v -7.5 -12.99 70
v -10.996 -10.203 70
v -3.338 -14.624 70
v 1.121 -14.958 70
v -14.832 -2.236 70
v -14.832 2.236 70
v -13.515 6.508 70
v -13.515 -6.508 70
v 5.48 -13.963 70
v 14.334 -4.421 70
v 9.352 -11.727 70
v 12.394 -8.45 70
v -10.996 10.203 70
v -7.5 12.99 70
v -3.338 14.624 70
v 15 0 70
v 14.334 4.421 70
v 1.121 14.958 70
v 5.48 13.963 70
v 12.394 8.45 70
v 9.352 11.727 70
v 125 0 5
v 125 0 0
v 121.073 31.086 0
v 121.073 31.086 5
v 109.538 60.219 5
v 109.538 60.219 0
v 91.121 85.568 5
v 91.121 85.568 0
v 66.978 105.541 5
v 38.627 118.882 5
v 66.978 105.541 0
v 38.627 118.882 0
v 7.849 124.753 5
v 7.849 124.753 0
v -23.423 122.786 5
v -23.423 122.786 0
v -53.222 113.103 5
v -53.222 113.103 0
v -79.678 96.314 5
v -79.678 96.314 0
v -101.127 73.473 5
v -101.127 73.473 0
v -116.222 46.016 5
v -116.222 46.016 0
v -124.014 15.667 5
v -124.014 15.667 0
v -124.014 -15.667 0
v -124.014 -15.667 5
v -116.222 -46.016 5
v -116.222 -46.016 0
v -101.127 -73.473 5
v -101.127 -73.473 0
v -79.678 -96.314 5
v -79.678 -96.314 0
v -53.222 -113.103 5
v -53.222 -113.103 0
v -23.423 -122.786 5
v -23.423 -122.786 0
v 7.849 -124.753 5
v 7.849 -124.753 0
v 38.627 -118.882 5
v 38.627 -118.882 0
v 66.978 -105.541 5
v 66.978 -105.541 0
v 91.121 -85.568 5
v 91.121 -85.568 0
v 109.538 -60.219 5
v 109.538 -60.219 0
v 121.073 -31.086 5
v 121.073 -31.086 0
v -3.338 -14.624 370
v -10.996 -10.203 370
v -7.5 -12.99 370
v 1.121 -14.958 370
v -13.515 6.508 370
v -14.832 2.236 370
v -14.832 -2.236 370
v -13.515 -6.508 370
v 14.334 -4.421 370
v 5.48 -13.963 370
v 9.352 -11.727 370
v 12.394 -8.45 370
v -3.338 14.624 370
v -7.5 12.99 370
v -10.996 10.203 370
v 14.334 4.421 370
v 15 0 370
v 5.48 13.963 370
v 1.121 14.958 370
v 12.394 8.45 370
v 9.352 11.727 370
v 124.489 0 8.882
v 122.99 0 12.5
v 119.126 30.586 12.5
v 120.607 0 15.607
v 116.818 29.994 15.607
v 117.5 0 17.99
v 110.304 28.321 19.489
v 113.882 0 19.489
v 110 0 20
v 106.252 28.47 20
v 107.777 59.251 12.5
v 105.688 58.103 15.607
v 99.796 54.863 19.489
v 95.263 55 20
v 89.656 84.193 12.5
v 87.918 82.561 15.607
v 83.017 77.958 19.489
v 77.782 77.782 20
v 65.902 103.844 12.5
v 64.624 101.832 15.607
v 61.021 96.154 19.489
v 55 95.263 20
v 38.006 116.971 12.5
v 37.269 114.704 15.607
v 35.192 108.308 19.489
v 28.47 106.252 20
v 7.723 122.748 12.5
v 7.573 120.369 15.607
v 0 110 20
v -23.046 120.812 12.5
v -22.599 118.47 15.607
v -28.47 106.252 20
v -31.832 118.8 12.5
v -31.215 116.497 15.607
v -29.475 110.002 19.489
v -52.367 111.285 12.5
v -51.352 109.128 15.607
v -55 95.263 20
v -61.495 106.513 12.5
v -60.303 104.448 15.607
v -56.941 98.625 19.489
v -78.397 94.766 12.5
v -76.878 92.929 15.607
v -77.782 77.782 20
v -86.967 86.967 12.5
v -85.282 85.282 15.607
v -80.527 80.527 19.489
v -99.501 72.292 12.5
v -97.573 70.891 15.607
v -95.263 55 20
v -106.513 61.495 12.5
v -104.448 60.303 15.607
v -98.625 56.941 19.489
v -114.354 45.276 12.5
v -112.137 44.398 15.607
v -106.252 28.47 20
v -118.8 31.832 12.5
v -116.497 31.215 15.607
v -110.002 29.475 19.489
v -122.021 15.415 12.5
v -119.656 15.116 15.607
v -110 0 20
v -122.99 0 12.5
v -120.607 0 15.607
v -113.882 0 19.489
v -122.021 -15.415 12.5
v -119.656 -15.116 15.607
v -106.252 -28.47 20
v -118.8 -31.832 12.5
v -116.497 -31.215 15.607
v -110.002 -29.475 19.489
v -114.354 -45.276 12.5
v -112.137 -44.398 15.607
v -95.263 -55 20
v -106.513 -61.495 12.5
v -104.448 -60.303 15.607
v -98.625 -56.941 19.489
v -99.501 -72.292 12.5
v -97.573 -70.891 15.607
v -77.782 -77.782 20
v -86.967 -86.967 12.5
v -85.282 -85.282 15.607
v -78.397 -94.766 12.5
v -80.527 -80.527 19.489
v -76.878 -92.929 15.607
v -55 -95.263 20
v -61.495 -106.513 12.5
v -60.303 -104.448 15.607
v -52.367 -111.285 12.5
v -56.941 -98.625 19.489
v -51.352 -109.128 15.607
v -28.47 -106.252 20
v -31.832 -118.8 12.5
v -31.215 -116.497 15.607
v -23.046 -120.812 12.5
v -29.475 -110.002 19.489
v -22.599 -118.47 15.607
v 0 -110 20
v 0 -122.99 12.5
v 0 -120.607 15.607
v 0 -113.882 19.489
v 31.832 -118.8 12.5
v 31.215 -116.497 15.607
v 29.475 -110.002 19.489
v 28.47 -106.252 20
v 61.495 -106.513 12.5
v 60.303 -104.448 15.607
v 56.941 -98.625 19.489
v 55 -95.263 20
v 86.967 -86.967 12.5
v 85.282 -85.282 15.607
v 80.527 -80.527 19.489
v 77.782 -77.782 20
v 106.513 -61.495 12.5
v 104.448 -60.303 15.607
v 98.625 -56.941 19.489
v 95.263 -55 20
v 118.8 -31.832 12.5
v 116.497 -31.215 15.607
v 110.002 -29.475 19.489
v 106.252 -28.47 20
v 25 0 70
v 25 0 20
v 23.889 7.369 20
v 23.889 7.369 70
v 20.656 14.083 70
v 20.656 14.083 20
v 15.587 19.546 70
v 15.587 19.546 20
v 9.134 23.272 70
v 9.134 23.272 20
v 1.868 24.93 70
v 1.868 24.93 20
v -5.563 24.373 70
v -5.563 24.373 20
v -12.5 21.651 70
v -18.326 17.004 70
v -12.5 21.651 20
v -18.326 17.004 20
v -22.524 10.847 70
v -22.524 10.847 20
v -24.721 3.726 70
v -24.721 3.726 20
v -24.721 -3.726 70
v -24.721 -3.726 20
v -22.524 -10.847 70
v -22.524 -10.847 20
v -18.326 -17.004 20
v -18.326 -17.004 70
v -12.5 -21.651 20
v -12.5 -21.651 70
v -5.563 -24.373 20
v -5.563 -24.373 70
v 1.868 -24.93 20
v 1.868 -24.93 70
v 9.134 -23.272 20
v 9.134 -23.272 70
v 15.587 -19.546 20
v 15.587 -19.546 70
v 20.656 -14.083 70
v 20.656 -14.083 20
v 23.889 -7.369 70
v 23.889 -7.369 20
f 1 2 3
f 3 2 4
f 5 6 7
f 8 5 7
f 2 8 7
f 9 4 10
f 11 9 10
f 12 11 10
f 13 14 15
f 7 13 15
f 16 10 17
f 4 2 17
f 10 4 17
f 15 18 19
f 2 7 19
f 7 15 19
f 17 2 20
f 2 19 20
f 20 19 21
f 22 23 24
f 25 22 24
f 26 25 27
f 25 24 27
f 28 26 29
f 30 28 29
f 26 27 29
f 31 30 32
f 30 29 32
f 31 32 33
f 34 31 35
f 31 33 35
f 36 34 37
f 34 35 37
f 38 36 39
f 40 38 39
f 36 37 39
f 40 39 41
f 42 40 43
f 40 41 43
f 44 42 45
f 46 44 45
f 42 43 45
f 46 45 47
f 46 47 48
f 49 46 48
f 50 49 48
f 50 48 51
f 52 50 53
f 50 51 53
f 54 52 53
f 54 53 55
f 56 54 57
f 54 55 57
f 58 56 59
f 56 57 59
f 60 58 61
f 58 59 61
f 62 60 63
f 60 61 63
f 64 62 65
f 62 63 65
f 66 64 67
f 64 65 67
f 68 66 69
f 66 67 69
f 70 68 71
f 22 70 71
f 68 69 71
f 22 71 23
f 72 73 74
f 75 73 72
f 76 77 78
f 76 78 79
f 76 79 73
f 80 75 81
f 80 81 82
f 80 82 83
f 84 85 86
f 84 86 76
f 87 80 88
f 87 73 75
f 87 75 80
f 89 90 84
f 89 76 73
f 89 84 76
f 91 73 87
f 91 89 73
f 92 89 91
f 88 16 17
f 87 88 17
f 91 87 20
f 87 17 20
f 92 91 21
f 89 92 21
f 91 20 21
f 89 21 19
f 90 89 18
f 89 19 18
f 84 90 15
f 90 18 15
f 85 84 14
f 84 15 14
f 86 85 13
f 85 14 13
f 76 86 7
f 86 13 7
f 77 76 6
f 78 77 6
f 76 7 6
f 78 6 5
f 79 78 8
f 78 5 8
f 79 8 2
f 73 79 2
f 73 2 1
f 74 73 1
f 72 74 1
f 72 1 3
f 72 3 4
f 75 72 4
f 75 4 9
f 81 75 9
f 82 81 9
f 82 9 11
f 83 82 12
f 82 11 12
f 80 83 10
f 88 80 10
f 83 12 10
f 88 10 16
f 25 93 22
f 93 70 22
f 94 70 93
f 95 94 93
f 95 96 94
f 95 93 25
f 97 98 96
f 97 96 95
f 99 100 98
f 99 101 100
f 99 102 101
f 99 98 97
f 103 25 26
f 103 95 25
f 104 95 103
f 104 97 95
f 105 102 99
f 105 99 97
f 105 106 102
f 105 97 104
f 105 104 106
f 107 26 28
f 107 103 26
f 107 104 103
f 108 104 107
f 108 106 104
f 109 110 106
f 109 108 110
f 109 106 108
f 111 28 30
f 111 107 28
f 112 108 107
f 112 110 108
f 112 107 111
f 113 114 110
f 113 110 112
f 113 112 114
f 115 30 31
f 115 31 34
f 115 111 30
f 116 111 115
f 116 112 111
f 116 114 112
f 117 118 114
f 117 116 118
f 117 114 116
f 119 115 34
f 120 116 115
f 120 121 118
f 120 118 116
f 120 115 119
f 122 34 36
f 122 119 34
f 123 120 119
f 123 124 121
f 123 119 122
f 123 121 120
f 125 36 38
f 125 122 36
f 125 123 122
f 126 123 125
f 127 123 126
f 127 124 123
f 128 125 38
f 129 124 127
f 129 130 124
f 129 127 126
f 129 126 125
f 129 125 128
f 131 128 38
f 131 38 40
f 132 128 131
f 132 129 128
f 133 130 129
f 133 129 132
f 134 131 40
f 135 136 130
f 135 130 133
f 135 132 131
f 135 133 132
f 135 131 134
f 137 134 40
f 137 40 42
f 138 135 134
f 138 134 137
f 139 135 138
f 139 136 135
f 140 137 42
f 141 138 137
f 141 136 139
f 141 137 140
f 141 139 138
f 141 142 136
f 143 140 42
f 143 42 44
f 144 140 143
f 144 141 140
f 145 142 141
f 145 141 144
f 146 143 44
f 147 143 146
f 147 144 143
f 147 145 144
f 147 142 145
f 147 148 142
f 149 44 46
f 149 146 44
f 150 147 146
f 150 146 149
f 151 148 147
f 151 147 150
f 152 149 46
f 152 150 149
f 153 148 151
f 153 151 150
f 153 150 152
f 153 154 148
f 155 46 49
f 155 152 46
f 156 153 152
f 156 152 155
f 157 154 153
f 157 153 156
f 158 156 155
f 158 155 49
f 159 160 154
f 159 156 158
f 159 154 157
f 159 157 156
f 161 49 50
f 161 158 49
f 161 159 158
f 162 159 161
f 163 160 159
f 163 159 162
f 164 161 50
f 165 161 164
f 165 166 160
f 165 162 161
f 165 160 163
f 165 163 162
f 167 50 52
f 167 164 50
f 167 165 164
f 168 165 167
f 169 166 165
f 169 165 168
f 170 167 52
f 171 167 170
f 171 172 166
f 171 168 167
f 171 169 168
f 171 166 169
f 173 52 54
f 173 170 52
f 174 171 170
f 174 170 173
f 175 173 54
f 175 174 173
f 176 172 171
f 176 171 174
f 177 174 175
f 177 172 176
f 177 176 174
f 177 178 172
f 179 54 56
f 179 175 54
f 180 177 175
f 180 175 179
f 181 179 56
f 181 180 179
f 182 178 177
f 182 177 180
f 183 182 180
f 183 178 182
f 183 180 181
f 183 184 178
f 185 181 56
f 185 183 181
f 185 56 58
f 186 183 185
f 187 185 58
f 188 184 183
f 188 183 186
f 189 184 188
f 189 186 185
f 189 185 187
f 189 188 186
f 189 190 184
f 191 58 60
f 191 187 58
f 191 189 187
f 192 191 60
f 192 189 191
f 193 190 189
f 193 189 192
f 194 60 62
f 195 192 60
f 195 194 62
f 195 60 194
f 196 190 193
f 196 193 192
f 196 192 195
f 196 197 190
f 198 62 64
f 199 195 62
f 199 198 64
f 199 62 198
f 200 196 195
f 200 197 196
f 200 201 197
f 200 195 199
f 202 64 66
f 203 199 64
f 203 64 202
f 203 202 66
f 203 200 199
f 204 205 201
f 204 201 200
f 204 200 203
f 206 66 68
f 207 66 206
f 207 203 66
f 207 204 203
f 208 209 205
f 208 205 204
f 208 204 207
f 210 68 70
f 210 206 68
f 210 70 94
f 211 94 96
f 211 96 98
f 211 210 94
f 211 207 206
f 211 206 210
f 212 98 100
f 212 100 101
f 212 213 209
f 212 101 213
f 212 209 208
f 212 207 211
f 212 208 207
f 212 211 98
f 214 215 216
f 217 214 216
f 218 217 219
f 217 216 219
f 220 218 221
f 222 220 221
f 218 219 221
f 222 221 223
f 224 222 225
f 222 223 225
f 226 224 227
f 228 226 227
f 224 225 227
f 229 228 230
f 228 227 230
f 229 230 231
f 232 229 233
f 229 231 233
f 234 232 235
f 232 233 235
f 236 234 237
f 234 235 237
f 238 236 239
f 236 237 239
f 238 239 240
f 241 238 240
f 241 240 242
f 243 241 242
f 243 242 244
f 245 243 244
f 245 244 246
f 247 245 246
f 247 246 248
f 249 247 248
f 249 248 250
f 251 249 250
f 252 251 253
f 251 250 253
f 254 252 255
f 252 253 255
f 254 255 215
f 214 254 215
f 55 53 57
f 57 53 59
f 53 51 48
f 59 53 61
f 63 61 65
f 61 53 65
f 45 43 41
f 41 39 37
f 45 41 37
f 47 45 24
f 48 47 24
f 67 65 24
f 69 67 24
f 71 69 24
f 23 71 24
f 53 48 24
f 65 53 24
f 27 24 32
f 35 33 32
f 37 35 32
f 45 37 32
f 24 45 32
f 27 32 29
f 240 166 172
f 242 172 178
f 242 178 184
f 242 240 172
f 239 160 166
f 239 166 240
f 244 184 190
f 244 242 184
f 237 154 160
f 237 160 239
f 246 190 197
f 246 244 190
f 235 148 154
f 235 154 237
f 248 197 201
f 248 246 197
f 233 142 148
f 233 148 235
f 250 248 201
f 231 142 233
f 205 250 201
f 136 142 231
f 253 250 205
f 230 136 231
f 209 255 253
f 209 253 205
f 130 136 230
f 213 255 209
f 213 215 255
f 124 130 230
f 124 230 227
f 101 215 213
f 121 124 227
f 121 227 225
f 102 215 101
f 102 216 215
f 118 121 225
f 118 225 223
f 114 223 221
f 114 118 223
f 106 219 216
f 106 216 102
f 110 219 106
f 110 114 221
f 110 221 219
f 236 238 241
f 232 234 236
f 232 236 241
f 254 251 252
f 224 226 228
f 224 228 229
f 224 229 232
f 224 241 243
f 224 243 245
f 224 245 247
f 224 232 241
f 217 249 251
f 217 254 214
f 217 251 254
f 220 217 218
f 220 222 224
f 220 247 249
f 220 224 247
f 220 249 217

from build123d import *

# Parameters (mm, degrees)
SKETCH_R     = 125
PAD_DEPTH    = 20
SKETCH001_R  = 25
PAD001_DEPTH = 50
FILLET006_R  = 15
SKETCH002_R  = 15
PAD002_DEPTH = 300


with BuildPart() as body1:
    # Sketch → Pad (new body)
    with BuildSketch(Plane.XY):
        Circle(SKETCH_R)
    extrude(amount=PAD_DEPTH)

    # Sketch001 (on Face3 of Pad) → Pad001 (join)
    with BuildSketch(Plane.XY.offset(20)):
        Circle(SKETCH001_R)
    extrude(amount=PAD001_DEPTH)

    # Fillet006
    fillet006_edges = [body1.edges().sort_by_distance(p)[0] for p in [
        (-125, 0, 20),
    ]]
    fillet(fillet006_edges, radius=FILLET006_R)


with BuildPart() as body2:
    # Sketch002 (on CopyPad) → Pad002 (new body)
    with BuildSketch(Plane.XY.offset(70)):
        Circle(SKETCH002_R)
    extrude(amount=PAD002_DEPTH)


solid = Compound([body1.part, body2.part])
